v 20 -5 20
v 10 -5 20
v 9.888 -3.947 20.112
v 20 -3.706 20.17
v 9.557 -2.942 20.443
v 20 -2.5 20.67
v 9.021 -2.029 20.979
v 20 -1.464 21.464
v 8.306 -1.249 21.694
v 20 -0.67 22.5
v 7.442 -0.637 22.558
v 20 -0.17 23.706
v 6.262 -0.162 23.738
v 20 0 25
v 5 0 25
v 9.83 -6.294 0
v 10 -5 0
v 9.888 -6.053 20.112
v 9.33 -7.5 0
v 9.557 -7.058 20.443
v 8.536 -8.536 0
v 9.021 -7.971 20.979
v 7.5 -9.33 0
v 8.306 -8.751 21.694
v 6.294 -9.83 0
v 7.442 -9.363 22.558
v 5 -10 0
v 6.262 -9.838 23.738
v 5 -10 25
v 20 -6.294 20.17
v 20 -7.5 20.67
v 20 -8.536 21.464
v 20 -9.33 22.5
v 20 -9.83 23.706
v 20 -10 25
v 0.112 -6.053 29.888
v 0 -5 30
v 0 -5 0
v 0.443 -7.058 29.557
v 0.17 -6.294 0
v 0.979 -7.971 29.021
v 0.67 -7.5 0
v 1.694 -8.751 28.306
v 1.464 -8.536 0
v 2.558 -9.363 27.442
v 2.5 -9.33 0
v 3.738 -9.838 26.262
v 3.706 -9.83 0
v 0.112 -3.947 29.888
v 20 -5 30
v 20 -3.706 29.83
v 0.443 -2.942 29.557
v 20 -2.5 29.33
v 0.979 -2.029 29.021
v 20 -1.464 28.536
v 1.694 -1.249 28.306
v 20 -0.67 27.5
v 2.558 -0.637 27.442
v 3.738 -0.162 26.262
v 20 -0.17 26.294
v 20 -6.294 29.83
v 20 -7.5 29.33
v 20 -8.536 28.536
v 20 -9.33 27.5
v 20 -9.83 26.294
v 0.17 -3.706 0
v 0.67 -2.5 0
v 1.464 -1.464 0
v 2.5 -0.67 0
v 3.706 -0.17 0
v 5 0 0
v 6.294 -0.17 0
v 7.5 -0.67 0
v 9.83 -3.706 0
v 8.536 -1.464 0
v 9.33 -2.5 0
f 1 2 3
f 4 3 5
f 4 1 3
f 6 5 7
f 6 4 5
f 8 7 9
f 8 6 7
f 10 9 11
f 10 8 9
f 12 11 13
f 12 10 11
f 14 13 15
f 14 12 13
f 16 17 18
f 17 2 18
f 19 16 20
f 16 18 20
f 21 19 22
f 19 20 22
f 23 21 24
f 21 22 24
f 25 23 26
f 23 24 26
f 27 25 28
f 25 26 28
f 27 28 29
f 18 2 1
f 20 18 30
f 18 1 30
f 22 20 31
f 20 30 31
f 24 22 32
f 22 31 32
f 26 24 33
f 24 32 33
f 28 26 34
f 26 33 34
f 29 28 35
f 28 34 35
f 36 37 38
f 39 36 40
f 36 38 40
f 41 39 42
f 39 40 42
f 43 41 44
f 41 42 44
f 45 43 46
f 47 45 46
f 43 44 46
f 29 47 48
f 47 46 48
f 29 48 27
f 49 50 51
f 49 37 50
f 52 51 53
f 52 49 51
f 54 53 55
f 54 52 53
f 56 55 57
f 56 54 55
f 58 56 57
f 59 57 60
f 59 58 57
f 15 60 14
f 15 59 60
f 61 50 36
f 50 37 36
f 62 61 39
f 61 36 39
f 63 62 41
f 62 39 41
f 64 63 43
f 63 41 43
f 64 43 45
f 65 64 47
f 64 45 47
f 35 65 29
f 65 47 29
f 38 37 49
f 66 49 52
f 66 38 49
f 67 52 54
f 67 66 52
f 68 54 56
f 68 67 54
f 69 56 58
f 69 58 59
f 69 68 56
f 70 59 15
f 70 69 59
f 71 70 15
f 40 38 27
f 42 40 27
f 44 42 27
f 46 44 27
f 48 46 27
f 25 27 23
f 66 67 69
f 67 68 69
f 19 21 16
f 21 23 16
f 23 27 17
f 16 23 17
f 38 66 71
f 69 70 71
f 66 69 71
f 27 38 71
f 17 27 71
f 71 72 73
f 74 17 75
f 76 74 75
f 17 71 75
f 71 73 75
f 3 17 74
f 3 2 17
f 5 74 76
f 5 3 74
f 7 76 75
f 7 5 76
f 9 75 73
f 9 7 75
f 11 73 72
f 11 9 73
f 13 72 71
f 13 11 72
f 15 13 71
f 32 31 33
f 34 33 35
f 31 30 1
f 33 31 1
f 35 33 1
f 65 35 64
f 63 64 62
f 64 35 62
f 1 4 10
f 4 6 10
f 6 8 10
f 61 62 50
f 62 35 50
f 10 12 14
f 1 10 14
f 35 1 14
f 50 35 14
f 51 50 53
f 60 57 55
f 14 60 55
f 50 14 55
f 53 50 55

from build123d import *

# Parameters (mm, degrees)
F1_DEPTH = 10
F2_R     = 4.99999


# Not quite as in the source:
# - a fillet or chamfer is up to 0.001 mm smaller than in the source, because OpenCascade refuses the exact size


with BuildPart() as f1:
    # F0 (on Front) → F1 (new body)
    with BuildSketch(Plane.XZ):
        Polygon((0, 30), (0, 0), (10, 0), (10, 20), (20, 20), (20, 30), align=None)
    extrude(amount=F1_DEPTH)

    # F2 (radius 5 in the source; OpenCascade refuses exactly that, so slightly less here)
    f2_edges = [f1.edges().sort_by_distance(p)[0] for p in [
        (10, -10, 30),
        (10, 0, 30),
        (0, -10, 15),
        (10, -10, 10),
        (15, -10, 20),
        (10, 0, 10),
        (15, 0, 20),
        (0, 0, 15),
    ]]
    fillet(f2_edges, radius=F2_R)


solid = f1.part
